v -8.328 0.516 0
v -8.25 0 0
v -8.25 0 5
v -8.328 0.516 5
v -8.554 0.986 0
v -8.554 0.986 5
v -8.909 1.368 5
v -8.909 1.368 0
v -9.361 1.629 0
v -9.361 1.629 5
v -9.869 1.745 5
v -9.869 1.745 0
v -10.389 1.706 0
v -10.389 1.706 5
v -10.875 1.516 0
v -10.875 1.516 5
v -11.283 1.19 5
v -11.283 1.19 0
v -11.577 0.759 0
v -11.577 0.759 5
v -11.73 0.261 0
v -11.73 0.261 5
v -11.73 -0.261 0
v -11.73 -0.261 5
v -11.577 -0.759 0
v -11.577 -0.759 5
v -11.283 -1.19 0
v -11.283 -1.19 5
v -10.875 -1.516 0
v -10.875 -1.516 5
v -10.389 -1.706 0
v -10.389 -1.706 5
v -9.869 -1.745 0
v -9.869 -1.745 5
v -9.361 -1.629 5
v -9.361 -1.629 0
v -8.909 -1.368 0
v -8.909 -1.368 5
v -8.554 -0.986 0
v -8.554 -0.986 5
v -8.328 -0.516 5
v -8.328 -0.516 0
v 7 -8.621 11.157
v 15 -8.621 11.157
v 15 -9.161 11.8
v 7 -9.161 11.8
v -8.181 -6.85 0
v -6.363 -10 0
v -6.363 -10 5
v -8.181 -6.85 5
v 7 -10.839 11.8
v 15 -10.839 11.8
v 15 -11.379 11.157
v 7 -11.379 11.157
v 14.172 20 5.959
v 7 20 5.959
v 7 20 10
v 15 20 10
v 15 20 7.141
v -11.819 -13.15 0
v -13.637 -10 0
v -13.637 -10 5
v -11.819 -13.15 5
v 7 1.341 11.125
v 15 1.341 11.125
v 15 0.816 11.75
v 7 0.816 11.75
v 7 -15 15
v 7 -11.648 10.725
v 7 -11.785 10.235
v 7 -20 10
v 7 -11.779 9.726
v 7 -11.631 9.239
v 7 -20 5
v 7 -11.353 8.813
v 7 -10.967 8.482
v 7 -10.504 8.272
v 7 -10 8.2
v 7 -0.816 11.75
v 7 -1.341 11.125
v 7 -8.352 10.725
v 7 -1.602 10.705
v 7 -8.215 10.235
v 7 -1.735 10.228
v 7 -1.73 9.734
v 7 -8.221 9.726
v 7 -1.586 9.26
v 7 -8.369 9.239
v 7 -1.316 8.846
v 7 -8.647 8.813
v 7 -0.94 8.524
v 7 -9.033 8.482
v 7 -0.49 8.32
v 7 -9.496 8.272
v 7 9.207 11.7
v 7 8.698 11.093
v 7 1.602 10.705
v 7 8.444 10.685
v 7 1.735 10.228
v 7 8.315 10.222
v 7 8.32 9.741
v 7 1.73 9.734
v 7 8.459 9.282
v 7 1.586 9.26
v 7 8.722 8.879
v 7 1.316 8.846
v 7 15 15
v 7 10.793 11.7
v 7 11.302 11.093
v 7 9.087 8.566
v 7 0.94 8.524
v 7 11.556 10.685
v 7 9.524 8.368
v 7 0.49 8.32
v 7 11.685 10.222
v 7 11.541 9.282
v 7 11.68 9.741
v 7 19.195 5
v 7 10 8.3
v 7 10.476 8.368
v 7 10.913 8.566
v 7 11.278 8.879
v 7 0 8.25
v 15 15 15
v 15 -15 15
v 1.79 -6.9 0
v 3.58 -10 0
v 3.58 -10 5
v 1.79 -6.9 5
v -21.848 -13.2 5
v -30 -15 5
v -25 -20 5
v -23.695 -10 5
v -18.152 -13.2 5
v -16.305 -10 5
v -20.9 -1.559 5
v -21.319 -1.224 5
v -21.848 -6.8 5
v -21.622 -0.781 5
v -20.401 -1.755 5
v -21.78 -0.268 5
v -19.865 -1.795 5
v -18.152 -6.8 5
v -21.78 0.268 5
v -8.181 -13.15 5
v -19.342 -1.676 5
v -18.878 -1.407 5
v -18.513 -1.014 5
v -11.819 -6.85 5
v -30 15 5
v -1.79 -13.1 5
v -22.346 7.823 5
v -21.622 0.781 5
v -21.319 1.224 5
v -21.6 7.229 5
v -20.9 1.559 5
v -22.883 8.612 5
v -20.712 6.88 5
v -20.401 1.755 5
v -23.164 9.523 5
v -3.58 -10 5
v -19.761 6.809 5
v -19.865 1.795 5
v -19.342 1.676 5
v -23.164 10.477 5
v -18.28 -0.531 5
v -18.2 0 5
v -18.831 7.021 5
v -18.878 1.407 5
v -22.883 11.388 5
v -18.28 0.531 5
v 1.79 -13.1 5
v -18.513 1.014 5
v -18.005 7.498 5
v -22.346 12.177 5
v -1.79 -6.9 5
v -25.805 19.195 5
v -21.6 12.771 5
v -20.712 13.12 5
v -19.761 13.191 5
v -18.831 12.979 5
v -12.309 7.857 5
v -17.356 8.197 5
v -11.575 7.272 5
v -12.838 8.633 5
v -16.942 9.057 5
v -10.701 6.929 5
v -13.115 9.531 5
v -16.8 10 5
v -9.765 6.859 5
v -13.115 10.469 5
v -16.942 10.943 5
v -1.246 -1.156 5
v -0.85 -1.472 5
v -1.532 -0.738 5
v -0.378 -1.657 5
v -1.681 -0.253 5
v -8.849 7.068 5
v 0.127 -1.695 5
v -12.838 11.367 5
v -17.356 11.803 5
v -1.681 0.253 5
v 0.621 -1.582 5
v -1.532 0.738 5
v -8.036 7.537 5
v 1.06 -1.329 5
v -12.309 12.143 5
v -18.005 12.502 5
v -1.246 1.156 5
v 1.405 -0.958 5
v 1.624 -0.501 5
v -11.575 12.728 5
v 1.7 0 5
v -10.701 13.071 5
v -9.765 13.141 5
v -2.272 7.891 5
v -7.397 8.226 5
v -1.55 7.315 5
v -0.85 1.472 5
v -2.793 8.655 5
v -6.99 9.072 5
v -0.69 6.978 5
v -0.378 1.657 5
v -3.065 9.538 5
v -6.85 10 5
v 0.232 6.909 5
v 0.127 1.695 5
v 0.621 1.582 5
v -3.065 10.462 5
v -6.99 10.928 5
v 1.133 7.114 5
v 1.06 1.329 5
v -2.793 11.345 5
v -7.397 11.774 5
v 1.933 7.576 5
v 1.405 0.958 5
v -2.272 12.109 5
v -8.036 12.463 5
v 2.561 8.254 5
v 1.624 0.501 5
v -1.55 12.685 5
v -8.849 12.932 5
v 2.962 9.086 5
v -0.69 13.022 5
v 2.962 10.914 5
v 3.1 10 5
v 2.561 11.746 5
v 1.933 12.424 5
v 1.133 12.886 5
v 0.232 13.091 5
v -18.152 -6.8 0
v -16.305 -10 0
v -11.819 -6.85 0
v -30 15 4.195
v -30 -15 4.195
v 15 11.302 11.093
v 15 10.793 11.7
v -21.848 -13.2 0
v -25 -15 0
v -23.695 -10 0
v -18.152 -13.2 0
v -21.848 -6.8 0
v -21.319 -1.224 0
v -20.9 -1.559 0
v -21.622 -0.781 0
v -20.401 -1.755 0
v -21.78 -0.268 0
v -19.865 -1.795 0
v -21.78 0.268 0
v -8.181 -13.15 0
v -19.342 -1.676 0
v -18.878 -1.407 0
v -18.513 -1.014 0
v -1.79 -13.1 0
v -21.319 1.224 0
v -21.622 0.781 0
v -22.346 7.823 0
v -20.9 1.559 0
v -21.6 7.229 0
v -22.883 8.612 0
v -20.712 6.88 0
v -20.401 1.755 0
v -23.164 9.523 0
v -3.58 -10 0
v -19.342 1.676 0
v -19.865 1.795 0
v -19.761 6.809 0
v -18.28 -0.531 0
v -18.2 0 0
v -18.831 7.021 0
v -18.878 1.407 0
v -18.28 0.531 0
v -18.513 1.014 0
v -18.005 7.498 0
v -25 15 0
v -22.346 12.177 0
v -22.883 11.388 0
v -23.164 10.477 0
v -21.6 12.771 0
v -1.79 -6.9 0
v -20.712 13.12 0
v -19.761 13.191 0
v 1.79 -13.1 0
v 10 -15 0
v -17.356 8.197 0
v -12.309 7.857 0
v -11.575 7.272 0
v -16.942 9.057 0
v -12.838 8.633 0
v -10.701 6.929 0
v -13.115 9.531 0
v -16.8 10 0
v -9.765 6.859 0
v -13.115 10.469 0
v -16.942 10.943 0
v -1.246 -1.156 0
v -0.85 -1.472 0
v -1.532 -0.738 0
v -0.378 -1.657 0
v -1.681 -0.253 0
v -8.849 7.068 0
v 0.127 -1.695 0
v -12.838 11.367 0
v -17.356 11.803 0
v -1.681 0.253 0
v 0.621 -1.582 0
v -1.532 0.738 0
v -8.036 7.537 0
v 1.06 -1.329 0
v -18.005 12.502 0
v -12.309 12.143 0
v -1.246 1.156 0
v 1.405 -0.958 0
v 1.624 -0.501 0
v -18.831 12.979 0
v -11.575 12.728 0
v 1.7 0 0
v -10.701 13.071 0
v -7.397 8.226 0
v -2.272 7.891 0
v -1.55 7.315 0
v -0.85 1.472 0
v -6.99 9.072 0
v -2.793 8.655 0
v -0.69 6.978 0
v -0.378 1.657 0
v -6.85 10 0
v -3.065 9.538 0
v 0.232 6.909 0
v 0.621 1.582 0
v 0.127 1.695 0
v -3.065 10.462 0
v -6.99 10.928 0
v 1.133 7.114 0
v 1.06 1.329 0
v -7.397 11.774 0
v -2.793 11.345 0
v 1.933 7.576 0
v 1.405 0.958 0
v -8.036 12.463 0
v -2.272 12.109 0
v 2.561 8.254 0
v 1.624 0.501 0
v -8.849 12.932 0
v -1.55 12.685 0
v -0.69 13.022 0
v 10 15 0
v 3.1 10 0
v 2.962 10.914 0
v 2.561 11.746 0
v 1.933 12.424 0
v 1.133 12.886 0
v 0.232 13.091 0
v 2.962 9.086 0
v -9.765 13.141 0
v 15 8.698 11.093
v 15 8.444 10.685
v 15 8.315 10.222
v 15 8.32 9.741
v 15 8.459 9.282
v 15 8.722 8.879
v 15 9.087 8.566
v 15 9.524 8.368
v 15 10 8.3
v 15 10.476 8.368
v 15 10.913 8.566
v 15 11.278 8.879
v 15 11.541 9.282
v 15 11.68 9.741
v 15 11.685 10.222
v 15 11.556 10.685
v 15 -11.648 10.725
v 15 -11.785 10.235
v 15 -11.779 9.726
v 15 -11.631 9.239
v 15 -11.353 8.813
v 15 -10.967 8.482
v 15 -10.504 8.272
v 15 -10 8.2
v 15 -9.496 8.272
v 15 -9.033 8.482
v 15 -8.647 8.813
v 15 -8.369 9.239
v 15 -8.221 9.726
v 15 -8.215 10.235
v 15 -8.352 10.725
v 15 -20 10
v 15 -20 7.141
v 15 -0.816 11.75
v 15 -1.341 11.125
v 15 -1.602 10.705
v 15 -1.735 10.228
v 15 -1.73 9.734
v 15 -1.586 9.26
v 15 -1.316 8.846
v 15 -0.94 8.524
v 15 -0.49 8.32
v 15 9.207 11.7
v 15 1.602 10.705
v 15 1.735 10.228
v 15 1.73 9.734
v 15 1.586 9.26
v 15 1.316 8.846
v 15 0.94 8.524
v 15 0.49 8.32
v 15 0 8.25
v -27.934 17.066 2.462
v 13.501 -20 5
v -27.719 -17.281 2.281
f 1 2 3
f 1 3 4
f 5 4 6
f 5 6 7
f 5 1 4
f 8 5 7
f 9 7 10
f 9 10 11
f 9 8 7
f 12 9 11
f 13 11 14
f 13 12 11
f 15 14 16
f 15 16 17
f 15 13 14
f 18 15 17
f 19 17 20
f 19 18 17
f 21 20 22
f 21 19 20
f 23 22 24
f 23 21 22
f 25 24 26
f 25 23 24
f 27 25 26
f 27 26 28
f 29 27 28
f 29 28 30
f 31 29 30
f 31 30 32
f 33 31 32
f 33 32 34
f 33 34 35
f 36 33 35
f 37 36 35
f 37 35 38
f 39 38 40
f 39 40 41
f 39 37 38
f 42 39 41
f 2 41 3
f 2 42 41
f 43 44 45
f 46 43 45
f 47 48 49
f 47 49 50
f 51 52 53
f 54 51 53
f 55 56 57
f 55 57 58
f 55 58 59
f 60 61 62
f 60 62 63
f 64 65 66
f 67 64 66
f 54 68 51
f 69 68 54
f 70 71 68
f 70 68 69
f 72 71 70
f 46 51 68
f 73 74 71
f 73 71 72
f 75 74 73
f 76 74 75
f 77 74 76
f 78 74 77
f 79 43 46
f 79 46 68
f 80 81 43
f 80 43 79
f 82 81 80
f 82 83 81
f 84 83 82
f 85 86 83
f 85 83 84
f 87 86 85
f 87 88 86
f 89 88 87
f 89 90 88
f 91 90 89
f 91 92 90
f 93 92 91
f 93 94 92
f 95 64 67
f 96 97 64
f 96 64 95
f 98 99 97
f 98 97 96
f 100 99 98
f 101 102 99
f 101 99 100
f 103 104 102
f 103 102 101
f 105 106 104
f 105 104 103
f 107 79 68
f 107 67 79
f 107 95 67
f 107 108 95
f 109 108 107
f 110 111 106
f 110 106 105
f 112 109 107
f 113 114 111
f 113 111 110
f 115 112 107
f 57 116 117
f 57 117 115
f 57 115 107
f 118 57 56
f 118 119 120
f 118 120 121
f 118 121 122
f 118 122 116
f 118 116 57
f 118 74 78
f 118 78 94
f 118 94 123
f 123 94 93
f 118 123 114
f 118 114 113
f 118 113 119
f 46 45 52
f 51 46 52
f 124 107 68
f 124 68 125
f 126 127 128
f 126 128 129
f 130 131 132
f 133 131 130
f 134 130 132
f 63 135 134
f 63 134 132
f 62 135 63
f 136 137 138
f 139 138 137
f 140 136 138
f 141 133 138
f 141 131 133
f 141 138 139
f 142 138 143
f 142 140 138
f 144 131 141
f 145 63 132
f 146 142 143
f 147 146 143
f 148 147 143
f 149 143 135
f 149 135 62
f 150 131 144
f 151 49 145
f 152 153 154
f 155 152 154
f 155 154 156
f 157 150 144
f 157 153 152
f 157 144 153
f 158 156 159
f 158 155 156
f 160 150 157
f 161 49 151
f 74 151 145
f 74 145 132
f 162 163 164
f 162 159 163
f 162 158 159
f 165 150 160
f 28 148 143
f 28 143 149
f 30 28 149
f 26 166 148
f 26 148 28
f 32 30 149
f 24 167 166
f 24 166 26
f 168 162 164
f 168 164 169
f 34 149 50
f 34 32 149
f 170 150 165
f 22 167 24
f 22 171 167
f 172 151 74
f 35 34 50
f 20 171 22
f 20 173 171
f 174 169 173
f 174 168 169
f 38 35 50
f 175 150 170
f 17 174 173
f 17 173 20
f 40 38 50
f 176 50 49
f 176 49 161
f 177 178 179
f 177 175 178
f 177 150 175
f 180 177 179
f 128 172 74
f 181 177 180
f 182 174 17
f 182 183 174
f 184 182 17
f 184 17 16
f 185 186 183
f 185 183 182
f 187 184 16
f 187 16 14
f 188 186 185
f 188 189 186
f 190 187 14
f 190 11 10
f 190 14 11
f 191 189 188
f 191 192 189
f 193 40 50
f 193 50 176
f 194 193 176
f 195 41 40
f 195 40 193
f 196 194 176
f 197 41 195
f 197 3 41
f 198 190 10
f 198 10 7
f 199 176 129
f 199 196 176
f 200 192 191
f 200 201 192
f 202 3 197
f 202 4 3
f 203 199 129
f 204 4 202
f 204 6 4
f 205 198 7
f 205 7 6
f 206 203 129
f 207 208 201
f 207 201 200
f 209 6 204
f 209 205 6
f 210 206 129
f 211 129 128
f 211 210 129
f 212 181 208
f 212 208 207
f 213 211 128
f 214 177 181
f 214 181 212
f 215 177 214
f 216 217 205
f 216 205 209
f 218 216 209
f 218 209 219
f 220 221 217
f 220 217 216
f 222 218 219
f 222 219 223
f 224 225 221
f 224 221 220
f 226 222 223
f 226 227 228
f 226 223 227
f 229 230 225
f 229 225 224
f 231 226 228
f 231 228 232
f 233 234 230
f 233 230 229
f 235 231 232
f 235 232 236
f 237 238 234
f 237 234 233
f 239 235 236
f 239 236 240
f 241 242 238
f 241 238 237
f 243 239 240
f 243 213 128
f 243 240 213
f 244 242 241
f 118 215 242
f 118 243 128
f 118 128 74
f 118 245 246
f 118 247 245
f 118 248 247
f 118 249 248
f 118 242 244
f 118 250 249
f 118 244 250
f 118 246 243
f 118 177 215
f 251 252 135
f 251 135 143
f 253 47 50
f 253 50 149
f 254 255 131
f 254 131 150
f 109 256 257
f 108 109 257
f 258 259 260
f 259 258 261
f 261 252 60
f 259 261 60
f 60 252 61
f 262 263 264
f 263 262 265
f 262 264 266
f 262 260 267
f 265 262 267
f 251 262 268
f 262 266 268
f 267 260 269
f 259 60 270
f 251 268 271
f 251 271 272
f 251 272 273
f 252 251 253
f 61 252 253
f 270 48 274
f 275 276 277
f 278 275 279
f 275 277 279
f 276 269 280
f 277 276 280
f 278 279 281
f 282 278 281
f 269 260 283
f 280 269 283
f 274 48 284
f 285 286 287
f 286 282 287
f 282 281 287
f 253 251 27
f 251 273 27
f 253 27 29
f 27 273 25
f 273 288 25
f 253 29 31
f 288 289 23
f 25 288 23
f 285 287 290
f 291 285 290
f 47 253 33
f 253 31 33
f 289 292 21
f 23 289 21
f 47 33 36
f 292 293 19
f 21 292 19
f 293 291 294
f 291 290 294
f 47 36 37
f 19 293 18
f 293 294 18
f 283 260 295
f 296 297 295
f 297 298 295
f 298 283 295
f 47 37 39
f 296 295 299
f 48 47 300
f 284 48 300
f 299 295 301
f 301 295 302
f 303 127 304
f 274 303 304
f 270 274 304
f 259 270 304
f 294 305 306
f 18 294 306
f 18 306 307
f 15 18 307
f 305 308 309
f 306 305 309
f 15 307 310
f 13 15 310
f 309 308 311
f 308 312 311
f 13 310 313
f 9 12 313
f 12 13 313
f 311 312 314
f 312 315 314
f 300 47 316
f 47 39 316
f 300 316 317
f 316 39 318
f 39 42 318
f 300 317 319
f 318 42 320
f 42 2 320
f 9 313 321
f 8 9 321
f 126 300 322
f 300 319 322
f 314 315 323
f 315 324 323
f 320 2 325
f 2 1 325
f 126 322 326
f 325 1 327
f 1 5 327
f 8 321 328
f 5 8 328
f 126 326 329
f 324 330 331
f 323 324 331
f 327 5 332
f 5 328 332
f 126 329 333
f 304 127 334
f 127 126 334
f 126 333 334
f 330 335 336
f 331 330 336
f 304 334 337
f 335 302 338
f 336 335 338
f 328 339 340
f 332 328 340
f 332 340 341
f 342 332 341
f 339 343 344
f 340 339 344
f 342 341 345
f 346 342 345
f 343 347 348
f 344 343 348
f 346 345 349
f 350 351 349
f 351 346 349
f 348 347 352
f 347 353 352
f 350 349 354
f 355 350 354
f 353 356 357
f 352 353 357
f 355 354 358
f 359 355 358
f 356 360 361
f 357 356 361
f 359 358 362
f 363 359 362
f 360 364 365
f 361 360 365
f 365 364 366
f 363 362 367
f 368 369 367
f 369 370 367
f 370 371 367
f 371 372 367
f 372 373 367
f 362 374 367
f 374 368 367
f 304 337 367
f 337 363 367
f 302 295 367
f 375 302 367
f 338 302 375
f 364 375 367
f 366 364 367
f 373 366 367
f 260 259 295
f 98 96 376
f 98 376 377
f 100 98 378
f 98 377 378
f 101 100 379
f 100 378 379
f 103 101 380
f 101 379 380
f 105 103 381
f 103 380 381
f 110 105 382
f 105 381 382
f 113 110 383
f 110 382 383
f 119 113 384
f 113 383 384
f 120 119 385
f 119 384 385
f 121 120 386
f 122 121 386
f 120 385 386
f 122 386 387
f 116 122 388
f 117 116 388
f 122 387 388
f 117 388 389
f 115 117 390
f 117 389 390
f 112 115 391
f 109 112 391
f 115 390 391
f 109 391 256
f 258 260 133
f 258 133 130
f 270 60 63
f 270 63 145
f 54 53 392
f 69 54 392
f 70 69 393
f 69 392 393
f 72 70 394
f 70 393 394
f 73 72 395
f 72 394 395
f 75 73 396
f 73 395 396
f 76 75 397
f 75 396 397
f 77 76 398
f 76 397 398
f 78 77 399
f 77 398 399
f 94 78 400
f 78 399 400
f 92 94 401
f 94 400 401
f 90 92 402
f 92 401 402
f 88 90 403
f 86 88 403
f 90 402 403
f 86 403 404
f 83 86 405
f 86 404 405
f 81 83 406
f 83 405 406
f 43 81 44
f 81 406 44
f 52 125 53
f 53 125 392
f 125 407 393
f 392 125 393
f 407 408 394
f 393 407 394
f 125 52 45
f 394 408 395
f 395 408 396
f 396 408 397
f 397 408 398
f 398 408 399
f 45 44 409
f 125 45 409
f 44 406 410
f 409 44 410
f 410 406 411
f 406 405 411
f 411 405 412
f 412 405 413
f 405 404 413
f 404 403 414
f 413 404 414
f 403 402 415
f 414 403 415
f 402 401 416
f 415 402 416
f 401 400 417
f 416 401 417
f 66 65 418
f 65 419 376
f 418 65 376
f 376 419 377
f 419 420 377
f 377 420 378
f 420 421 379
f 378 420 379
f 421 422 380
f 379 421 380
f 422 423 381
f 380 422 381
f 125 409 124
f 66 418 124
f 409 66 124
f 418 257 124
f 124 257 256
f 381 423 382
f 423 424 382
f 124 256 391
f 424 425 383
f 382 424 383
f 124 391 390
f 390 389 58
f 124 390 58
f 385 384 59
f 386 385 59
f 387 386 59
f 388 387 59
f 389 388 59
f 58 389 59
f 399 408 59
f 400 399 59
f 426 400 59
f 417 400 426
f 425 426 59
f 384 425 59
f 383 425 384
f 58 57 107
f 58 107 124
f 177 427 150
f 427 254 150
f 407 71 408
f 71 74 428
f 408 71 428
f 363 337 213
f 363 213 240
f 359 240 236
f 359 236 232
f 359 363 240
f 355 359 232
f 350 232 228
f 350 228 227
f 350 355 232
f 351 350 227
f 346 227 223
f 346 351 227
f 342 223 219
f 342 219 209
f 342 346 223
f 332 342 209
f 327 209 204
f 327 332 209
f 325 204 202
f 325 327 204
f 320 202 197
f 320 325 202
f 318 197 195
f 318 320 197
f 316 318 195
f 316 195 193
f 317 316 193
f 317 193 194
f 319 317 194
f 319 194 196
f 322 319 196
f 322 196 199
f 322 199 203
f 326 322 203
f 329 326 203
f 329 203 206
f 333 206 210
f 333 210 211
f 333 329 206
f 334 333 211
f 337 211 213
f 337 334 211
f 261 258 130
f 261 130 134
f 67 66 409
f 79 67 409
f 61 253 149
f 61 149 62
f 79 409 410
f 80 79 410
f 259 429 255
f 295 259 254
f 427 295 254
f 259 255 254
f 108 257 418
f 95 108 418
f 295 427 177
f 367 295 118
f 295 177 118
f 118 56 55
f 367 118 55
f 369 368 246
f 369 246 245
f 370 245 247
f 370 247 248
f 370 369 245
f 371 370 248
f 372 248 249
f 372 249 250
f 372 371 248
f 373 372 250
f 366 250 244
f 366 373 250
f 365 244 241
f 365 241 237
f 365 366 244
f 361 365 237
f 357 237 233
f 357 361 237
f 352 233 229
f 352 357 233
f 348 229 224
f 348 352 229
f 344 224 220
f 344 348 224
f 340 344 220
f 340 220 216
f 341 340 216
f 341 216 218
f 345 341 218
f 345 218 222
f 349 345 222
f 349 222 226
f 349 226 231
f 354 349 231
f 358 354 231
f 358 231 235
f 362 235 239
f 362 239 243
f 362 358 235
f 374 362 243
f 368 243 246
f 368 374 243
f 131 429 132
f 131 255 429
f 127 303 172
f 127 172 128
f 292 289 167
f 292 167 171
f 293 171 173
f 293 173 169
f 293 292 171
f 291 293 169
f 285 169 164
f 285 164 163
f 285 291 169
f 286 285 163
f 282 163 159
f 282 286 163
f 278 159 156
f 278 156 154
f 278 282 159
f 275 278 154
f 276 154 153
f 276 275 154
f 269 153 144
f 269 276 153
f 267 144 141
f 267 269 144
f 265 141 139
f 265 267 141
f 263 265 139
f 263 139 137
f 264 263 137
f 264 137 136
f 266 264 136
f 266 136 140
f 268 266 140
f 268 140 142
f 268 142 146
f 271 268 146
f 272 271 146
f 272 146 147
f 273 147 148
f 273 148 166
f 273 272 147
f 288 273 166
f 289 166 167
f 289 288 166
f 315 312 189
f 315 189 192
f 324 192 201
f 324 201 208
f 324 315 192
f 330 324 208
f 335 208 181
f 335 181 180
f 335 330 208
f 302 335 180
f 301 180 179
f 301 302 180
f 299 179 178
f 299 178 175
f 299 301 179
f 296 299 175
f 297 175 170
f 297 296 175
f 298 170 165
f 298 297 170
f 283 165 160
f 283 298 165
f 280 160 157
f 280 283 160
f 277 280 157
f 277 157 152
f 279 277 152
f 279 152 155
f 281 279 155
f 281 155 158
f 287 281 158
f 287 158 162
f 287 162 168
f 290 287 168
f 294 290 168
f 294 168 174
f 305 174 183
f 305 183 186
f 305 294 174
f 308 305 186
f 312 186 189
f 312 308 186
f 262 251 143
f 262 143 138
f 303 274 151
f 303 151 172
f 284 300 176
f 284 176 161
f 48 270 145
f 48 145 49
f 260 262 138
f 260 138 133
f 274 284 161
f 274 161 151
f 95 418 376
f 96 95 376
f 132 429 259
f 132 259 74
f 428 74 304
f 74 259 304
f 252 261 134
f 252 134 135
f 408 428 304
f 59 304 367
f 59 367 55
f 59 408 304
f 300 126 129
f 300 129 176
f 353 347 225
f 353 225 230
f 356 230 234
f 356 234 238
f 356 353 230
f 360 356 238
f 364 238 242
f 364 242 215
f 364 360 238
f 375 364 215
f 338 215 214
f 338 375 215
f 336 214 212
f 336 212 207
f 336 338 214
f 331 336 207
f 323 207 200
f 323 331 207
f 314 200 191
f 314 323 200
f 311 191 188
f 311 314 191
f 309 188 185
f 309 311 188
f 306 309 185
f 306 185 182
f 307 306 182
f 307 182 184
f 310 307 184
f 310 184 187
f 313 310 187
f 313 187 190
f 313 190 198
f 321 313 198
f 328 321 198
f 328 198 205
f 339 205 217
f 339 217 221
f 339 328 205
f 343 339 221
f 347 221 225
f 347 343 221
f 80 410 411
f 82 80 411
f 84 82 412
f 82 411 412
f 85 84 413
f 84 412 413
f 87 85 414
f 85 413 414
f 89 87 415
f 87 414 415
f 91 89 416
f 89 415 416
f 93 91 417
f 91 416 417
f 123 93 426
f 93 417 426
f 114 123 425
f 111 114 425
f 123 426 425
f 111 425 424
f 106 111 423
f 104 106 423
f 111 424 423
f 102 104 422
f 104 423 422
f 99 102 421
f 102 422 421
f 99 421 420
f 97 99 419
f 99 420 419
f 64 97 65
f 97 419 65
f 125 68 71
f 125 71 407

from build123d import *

# Parameters (mm, degrees)
SKETCH1_W           = 45
SKETCH1_H           = 40
SKETCH1_R           = 1.8
SKETCH1_R_2         = 1.75
SKETCH1_R_3         = 1.7
SKETCH1_R_4         = 3.2
SKETCH1_R_5         = 3.15
SKETCH1_R_6         = 3.1
BOSS_EXTRUDE1_DEPTH = 5
SKETCH2_W           = 8
SKETCH2_H           = 40
BOSS_EXTRUDE2_DEPTH = 10
CUT_EXTRUDE1_REACH  = 53.478
CHAMFER1_SIZE       = 5
CHAMFER2_SIZE       = 5
CHAMFER2_SIZE2      = 5.958767963
CHAMFER3_SIZE       = 5
CHAMFER4_SIZE       = 5
CHAMFER4_SIZE2      = 7.140740034
CHAMFER5_SIZE       = 5
CHAMFER5_SIZE2      = 4.195498156


with BuildPart() as part:
    # Sketch1 → Boss-Extrude1 (new body)
    with BuildSketch(Plane.XY):
        with Locations((-7.5, 0)):
            Rectangle(SKETCH1_W, SKETCH1_H)
        with Locations((-20, 0)):
            Circle(SKETCH1_R, mode=Mode.SUBTRACT)
        with Locations((-10, 0)):
            Circle(SKETCH1_R_2, mode=Mode.SUBTRACT)
        Circle(SKETCH1_R_3, mode=Mode.SUBTRACT)
        with Locations((-20, 10)):
            Circle(SKETCH1_R_4, mode=Mode.SUBTRACT)
        with Locations((-10, 10)):
            Circle(SKETCH1_R_5, mode=Mode.SUBTRACT)
        with Locations((0, 10)):
            Circle(SKETCH1_R_6, mode=Mode.SUBTRACT)
        Polygon((-16.304958277, -10), (-18.152479139, -6.8), (-21.847520861, -6.8), (-23.695041723, -10), (-21.847520861, -13.2), (-18.152479139, -13.2), align=None, mode=Mode.SUBTRACT)
        Polygon((-6.362693304, -10), (-8.181346652, -6.85), (-11.818653348, -6.85), (-13.637306696, -10), (-11.818653348, -13.15), (-8.181346652, -13.15), align=None, mode=Mode.SUBTRACT)
        Polygon((3.579571669, -10), (1.789785834, -6.9), (-1.789785834, -6.9), (-3.579571669, -10), (-1.789785834, -13.1), (1.789785834, -13.1), align=None, mode=Mode.SUBTRACT)
    extrude(amount=BOSS_EXTRUDE1_DEPTH)

    # Sketch2 → Boss-Extrude2 (add)
    with BuildSketch(Plane.XY.offset(5)):
        with Locations((11, 0)):
            Rectangle(SKETCH2_W, SKETCH2_H)
    extrude(amount=BOSS_EXTRUDE2_DEPTH)

    # Sketch3 → Cut-Extrude1 (cut, up to next)
    with BuildSketch(Plane(origin=(15, 0, 0), x_dir=(0, 0, -1), z_dir=(1, 0, 0)), mode=Mode.PRIVATE) as cut_extrude1_sk1:
        with BuildLine():
            Line((-11.092738936, 11.302275553), (-11.7, 10.792723019))
            Line((-11.7, 10.792723019), (-11.7, 9.207276981))
            Line((-11.7, 9.207276981), (-11.092738936, 8.697724447))
            ThreePointArc((-11.092738936, 8.697724447), (-8.3, 10), (-11.092738936, 11.302275553))
        make_face()
    cut_extrude1_tool1 = extrude(cut_extrude1_sk1.sketch, amount=-CUT_EXTRUDE1_REACH, mode=Mode.PRIVATE) & part.part
    # Sketch3 → Cut-Extrude1 (cut, up to next)
    with BuildSketch(Plane(origin=(15, 0, 0), x_dir=(0, 0, -1), z_dir=(1, 0, 0)), mode=Mode.PRIVATE) as cut_extrude1_sk2:
        with BuildLine():
            Line((-11.124878317, 1.340577775), (-11.75, 0.816038402))
            Line((-11.75, 0.816038402), (-11.75, -0.816038402))
            Line((-11.75, -0.816038402), (-11.124878317, -1.340577775))
            ThreePointArc((-11.124878317, -1.340577775), (-8.25, 0), (-11.124878317, 1.340577775))
        make_face()
    cut_extrude1_tool2 = extrude(cut_extrude1_sk2.sketch, amount=-CUT_EXTRUDE1_REACH, mode=Mode.PRIVATE) & part.part
    # Sketch3 → Cut-Extrude1 (cut, up to next)
    with BuildSketch(Plane(origin=(15, 0, 0), x_dir=(0, 0, -1), z_dir=(1, 0, 0)), mode=Mode.PRIVATE) as cut_extrude1_sk3:
        with BuildLine():
            Line((-11.157017697, -8.621120002), (-11.8, -9.160646215))
            Line((-11.8, -9.160646215), (-11.8, -10.839353785))
            Line((-11.8, -10.839353785), (-11.157017697, -11.378879998))
            ThreePointArc((-11.157017697, -11.378879998), (-8.2, -10), (-11.157017697, -8.621120002))
        make_face()
    cut_extrude1_tool3 = extrude(cut_extrude1_sk3.sketch, amount=-CUT_EXTRUDE1_REACH, mode=Mode.PRIVATE) & part.part
    add(cut_extrude1_tool1.solids().sort_by_distance((15, 10, 10.029483))[0], mode=Mode.SUBTRACT)
    add(cut_extrude1_tool2.solids().sort_by_distance((15, 0, 10.03035))[0], mode=Mode.SUBTRACT)
    add(cut_extrude1_tool3.solids().sort_by_distance((15, -10, 10.031217))[0], mode=Mode.SUBTRACT)

    # Chamfer1
    chamfer1_edges = [part.edges().sort_by_distance(p)[0] for p in [
        (-30, -20, 2.5),
        (-30, 20, 2.5),
        (11, -20, 15),
        (11, 20, 15),
    ]]
    chamfer(chamfer1_edges, length=CHAMFER1_SIZE)

    # Chamfer2
    chamfer2_edges = [part.edges().sort_by_distance(p)[0] for p in [
        (-5, 20, 0),
    ]]
    chamfer2_side = [part.faces().sort_by_distance(p)[0] for p in [
        (-6.76599085, 0.061969604, 0),
    ]]
    chamfer(chamfer2_edges, length=CHAMFER2_SIZE, length2=CHAMFER2_SIZE2, reference=chamfer2_side[0])

    # Chamfer3
    chamfer3_edges = [part.edges().sort_by_distance(p)[0] for p in [
        (-5, -20, 0),
    ]]
    chamfer(chamfer3_edges, length=CHAMFER3_SIZE)

    # Chamfer4
    chamfer4_edges = [part.edges().sort_by_distance(p)[0] for p in [
        (15, 0, 0),
    ]]
    chamfer4_side = [part.faces().sort_by_distance(p)[0] for p in [
        (-6.951751809, 0.085391734, 0),
    ]]
    chamfer(chamfer4_edges, length=CHAMFER4_SIZE, length2=CHAMFER4_SIZE2, reference=chamfer4_side[0])

    # Chamfer5
    chamfer5_edges = [part.edges().sort_by_distance(p)[0] for p in [
        (-30, 0, 0),
    ]]
    chamfer5_side = [part.faces().sort_by_distance(p)[0] for p in [
        (-10, -14.5, 0),
    ]]
    chamfer(chamfer5_edges, length=CHAMFER5_SIZE, length2=CHAMFER5_SIZE2, reference=chamfer5_side[0])


solid = part.part
